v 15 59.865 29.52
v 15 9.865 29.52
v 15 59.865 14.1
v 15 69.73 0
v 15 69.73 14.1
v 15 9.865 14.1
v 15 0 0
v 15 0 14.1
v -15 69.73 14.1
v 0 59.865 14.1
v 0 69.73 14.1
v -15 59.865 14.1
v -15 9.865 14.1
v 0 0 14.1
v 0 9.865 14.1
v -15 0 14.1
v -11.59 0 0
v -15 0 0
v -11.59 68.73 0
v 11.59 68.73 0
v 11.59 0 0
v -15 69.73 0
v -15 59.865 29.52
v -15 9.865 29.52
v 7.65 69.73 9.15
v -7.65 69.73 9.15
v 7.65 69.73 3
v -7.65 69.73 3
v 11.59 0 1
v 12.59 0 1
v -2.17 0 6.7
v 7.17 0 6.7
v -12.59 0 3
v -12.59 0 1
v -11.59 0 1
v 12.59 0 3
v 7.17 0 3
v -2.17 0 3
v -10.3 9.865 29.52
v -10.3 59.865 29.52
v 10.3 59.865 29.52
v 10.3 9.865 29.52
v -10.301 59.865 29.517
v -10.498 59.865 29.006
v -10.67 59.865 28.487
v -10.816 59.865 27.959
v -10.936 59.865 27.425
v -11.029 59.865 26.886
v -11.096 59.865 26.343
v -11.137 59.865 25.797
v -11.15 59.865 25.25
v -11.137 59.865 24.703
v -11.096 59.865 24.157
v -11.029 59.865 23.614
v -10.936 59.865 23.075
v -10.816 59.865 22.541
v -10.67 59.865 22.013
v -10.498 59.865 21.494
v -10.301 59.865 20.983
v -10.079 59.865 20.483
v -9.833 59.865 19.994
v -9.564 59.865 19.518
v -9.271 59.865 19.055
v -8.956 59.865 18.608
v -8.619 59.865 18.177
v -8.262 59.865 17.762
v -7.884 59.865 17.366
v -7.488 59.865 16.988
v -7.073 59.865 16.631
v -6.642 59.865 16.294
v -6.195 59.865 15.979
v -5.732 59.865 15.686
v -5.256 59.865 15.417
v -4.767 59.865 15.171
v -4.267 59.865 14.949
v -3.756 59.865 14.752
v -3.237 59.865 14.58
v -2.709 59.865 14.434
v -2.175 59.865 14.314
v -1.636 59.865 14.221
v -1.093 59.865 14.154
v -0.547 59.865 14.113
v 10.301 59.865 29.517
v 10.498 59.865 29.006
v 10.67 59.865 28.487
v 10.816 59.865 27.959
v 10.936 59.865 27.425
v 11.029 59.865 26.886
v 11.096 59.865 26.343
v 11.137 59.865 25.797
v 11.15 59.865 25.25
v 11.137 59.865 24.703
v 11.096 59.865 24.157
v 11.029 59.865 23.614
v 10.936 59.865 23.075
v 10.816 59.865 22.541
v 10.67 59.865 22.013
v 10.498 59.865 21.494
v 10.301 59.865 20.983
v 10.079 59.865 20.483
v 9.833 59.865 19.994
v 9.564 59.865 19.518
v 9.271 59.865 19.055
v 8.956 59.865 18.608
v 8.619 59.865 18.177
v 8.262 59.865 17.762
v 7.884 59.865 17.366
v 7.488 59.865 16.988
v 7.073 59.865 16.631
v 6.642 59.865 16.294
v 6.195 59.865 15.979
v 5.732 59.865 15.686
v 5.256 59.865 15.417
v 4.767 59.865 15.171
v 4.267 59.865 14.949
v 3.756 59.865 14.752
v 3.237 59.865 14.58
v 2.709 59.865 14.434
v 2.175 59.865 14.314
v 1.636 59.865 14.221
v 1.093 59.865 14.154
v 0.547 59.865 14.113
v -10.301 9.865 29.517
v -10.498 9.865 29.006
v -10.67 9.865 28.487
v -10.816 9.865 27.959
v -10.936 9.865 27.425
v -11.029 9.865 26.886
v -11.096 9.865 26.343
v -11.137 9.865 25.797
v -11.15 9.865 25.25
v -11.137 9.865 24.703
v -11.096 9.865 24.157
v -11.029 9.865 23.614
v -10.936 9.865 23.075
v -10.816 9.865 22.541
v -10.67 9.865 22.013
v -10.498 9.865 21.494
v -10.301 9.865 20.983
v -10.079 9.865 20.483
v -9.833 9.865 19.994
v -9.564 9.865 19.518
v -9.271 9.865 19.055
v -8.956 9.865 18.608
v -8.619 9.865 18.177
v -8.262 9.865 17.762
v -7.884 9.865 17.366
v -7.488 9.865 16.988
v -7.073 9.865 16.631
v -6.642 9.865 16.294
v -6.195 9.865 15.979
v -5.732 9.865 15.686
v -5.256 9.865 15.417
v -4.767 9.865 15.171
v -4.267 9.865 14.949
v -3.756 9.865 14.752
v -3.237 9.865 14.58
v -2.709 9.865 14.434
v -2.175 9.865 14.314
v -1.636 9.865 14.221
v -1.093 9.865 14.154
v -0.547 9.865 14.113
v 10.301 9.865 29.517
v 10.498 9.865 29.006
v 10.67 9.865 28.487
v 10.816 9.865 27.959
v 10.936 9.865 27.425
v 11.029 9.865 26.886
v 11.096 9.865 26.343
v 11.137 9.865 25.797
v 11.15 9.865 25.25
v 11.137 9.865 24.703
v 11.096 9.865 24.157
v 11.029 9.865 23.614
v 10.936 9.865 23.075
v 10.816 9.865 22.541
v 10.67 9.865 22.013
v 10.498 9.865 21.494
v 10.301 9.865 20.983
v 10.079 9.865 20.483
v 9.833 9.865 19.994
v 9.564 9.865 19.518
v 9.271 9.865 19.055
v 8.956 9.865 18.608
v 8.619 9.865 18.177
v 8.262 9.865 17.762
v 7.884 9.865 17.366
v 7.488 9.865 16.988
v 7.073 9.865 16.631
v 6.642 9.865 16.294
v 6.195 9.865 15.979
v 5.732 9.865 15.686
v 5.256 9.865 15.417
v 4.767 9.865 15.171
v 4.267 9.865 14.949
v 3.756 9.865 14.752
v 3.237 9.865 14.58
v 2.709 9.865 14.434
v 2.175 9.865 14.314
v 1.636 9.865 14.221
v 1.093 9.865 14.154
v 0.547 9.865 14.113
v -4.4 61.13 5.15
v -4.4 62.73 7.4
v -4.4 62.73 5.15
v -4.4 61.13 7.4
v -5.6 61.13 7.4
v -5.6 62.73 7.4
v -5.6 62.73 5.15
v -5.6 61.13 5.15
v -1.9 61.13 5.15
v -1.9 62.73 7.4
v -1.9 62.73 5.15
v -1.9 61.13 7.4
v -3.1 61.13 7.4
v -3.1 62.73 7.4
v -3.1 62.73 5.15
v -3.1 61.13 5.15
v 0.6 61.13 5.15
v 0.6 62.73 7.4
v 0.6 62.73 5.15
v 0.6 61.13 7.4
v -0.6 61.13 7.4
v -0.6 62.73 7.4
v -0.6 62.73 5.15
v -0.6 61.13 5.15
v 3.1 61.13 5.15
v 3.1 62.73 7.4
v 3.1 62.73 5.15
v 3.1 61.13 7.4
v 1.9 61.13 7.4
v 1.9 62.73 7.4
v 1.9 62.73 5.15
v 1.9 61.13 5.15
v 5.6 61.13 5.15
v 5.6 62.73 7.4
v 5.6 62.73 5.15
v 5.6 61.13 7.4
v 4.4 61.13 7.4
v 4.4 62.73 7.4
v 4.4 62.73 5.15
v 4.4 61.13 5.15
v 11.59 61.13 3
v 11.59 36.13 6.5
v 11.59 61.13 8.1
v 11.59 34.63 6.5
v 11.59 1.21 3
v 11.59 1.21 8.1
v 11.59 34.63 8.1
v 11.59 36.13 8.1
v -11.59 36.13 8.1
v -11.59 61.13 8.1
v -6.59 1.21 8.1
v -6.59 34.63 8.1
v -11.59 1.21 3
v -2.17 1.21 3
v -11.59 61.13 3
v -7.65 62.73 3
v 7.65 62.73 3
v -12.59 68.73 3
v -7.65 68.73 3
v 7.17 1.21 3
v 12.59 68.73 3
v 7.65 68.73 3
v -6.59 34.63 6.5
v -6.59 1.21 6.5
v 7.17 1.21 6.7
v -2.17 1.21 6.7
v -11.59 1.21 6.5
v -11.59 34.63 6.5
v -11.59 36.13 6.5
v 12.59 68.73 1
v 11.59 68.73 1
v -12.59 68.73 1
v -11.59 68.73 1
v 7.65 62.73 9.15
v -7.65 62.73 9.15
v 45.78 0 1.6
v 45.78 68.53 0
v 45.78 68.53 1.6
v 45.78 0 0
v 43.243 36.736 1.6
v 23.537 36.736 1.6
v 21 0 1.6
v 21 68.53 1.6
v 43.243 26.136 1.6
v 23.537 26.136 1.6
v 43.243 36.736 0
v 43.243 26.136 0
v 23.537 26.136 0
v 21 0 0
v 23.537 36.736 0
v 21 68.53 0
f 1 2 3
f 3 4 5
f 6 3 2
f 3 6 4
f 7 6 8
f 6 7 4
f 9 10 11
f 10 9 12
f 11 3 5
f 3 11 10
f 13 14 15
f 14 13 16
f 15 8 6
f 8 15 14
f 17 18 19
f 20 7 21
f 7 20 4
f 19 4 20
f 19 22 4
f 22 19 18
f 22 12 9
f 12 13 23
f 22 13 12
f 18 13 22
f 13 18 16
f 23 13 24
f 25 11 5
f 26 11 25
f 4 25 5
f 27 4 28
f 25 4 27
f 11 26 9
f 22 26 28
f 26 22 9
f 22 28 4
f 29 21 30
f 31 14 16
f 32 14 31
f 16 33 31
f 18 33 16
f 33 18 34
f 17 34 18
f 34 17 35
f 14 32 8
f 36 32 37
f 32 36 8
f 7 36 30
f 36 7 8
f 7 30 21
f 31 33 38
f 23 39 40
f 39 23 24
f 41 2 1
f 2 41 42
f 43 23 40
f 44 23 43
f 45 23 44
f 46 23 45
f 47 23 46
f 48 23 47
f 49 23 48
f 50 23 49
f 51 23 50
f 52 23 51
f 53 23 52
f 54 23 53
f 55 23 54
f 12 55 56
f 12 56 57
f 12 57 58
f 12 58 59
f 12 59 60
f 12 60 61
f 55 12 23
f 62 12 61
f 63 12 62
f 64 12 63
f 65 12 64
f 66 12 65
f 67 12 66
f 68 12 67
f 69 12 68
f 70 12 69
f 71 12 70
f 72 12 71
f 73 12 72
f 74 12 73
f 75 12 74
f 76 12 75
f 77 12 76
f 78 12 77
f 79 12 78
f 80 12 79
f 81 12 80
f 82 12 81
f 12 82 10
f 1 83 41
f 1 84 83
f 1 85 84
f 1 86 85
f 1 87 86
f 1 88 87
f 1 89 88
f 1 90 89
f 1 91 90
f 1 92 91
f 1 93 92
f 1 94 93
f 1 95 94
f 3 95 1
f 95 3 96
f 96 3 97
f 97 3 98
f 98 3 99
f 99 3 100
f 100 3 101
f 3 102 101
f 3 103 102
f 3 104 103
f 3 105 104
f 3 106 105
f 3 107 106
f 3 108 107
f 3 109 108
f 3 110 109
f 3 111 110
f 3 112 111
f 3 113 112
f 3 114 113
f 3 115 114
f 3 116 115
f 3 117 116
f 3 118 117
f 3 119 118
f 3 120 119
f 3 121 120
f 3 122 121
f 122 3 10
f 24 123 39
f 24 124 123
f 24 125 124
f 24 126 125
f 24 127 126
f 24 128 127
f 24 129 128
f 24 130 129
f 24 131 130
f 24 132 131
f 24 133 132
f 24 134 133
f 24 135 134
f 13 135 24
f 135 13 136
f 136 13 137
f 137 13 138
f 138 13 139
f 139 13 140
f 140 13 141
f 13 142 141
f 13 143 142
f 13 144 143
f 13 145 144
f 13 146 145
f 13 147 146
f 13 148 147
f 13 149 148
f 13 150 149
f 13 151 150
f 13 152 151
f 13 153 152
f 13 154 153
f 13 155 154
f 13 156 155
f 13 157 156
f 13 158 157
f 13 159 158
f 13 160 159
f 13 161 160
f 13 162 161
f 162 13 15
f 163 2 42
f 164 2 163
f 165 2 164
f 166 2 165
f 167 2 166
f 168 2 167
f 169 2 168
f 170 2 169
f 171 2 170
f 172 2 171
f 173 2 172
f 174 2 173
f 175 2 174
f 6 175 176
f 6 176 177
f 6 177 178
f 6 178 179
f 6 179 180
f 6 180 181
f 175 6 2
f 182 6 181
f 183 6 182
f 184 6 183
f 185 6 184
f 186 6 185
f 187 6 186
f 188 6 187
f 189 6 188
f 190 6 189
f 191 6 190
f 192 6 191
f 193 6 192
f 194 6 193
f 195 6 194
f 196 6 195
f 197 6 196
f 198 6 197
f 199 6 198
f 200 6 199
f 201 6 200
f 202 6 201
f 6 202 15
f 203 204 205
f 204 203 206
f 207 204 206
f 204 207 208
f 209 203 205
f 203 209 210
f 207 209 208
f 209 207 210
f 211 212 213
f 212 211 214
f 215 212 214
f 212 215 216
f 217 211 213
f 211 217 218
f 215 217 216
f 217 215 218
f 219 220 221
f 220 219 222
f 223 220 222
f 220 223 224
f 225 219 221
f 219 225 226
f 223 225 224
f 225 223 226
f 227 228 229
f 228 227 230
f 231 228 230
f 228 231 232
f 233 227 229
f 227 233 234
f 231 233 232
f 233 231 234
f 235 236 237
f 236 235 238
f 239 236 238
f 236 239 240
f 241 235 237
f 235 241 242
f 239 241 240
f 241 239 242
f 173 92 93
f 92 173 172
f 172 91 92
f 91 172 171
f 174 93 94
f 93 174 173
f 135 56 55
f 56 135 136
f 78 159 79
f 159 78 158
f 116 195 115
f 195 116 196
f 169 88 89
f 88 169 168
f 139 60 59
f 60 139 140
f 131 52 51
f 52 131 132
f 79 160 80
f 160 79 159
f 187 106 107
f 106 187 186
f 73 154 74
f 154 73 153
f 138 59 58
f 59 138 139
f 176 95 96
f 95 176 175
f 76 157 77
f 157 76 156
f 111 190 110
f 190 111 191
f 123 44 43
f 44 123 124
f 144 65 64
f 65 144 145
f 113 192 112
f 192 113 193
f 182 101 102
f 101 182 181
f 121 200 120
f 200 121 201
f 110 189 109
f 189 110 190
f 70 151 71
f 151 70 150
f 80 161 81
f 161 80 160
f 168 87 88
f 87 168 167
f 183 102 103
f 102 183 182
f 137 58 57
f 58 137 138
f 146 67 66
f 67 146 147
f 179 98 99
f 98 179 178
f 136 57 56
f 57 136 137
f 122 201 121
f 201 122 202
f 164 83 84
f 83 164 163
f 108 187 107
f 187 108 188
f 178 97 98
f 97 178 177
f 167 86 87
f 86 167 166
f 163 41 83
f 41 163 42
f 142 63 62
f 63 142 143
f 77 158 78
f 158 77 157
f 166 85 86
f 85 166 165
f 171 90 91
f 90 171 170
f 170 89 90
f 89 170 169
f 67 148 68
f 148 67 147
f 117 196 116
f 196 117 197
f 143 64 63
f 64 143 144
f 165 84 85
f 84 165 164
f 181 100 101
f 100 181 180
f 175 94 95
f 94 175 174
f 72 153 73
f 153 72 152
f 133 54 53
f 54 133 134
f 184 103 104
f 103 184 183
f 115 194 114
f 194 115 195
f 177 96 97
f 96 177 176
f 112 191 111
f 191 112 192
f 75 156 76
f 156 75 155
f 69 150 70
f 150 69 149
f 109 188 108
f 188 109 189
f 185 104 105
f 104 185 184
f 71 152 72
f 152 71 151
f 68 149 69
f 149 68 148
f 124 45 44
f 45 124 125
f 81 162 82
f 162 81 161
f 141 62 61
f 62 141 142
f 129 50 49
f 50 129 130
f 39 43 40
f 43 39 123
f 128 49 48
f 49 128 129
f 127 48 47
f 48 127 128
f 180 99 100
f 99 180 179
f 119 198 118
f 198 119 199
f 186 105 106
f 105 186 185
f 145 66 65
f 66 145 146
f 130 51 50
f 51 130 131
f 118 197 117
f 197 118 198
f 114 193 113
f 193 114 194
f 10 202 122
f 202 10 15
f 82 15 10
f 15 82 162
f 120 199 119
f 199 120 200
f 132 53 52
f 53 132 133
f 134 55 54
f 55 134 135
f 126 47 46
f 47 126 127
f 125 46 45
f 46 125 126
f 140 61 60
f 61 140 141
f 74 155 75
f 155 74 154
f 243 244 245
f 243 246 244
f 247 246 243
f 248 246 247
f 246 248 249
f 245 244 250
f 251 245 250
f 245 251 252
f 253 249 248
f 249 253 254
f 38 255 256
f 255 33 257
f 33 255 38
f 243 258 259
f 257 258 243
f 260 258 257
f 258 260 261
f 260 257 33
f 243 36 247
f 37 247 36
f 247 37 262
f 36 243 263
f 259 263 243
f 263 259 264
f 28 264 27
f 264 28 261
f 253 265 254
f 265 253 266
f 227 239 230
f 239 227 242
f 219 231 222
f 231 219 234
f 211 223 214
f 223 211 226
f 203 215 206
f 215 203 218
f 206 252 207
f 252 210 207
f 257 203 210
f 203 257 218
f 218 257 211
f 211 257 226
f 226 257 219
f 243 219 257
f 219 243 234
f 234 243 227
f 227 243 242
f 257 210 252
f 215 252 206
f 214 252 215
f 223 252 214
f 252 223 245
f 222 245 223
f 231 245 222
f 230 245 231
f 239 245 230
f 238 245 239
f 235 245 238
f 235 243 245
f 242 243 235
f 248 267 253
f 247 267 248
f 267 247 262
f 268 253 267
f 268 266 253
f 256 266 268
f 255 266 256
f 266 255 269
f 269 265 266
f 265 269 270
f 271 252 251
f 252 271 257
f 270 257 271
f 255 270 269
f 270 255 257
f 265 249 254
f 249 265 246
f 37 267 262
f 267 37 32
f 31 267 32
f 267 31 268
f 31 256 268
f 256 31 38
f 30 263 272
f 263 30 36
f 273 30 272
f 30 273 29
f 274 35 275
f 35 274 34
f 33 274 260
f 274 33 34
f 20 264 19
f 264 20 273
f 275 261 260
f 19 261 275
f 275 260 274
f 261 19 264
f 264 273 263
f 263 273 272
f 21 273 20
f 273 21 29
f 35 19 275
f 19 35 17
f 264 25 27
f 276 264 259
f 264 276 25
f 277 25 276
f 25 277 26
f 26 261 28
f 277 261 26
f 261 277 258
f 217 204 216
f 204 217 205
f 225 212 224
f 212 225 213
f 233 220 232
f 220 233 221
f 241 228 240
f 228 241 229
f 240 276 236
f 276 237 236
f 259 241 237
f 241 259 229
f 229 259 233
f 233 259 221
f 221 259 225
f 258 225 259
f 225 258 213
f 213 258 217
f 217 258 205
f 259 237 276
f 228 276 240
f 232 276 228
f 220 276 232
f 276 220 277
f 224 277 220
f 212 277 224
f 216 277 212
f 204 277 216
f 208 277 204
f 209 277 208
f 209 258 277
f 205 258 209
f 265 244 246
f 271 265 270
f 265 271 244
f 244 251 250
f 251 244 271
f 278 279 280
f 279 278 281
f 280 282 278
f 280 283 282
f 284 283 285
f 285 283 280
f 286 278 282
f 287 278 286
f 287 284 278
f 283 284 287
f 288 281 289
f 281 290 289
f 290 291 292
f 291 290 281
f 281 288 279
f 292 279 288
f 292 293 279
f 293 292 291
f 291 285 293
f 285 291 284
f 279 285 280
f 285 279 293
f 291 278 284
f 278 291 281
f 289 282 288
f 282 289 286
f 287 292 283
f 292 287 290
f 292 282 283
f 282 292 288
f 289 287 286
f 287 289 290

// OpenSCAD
// file: params.scad
// Every part includes this file, so a fit measured on a test print changes in
// one place. All lengths in mm.

// Snap clip around an aerobar extension. The bore and the 30 mm block across
// the tube are the Onshape V8 crossbar's, which clips onto the Profile Design
// Airstryke extensions.
tube_bore = 22.3;
clip_width = 30;
// Solid between the top of the bore and the clip's closed face.
clip_floor = 6;
// The tightest of the fit test's 20.6, 21.0 and 21.4, and the best grip in PLA
// on a 10 mm slice. A full-length clip grips harder.
clip_mouth = 20.6;
// Over the tape where the bar pod sits: a paper strip's wrap length / pi.
bar_diameter = 32;

key_pitch = 19.05;

// Every fit-test cutout from 13.9 to 14.1 held a switch, so the middle one
// leaves margin either way.
switch_cutout = 14.0;
// MX switch clips latch under a lip this thick, and need a wider pocket below
// it to spring back out into.
switch_plate = 1.5;
switch_relief = 15.0;

m3_clearance = 3.4;
// Nominal M3 nuts are 2.4 thick and 5.5 across the flats.
m3_nut_depth = 2.6;
// main file
// The KB2040 in a box that snaps under a straight stretch of one extension,
// USB-C toward the base bar. A pod plugs into the JST XH header in its front
// face, so the board's own wiring is soldered once and stays put.
include <params.scad>

// Adafruit KB2040 (5302), from its board file: the PCB, and how far the USB-C
// receptacle hangs past the PCB's end and stands above it.
board = [33.02, 17.78, 1.6];
usb_overhang = 1.21;
usb_width = 8.94;
usb_height = 3.3;
// BOOT (SW3) and RESET (SW2) centers, from the PCB's USB-C end and from its
// D-pin edge, and their footprint along and across the board.
buttons = [[30.226, 3.8735], [30.226, 13.843]];
button = [4.6, 2.8];

// Top-entry B5B-XH-A, from JST's XH datasheet: across the pins, along the
// mating axis, and deep. GND and GP4 through GP7, for up to four keys.
xh_pins = 5;
xh_pitch = 2.5;
xh = [(xh_pins - 1) * xh_pitch + 4.9, 7, 5.75];
// The pin row sits 2.35 from one face and 3.4 from the other, so the slots
// take the header either way up.
xh_row = [2.35, 3.4];
pin_slot = 1.2;
// The header's tails go through this like through a PCB, and the solder on
// them holds the header in when a plug is pulled.
plate = 1.6;

clearance = 0.2;
stop = 1.5;
// Wires run forward here, beside the D-pin edge, not over the board's buttons.
channel = 5;
// Open on the lid side: room for the iron at every tail.
bay = 25;
// Snapped on and held at clip_mouth.
clip_length = 50;
// Along the board on either side of the buttons, for a fingernail.
reach = 3;
lid_thickness = 1.6;
groove = 1;
lip = 1;
front_lip = 1;
gap = 6;

r = tube_bore / 2;
inset = sqrt(r * r - (clip_mouth / 2) * (clip_mouth / 2));
pocket_width = board[1] + 2 * clearance;
inner = channel + pocket_width;
depth = board[2] + usb_height + clearance;
header_depth = xh[2] + 2 * clearance;
slot_height = lid_thickness + 2 * clearance;
// z of the board's floor (toward the tube), the lid's face, and the header's
// floor, deeper than the board's so the lid closes right under the USB-C.
ceiling = -(r + clip_floor);
opening = ceiling - depth;
header_top = opening + header_depth;
bottom = opening - slot_height - lip;
d_edge = -inner / 2 + channel + clearance;

// The receptacle ends flush with the back.
rear_wall = usb_overhang;
board_end = rear_wall + board[0] + 2 * clearance;
plate_y = board_end + stop + bay;
length = plate_y + plate + xh[1];

// Centered on the lid, so it lands over both buttons with either face up.
window_center = rear_wall + buttons[0][0];
window_length = button[0] + 2 * reach;
window_half = max([for (b = buttons) abs(d_edge + b[1]) + button[1] / 2]) + 1;

$fn = 128;

// Modeled as mounted and printed: the tube's center on the origin, running
// along y, the base bar toward -y, the mouth up.
module carrier() {
    difference() {
        union() {
            translate([-clip_width / 2, 0, bottom])
                cube([clip_width, length, -r - bottom]);
            translate([-clip_width / 2, (length - clip_length) / 2, bottom])
                cube([clip_width, clip_length, inset - bottom]);
        }
        translate([0, -1, 0]) rotate([-90, 0, 0]) cylinder(r = r, h = length + 2);
        translate([-inner / 2 + channel, rear_wall, opening])
            cube([pocket_width, plate_y - rear_wall, depth]);
        // Stops at the PCB's top, so the board's edge rests against the step.
        translate([-inner / 2, rear_wall, opening])
            cube([channel, plate_y - rear_wall, depth - board[2]]);
        translate([-inner / 2, board_end, opening])
            cube([inner, bay + stop, depth]);
        translate([d_edge + board[1] / 2 - usb_width / 2 - clearance, -1, bottom - 1])
            cube([usb_width + 2 * clearance, rear_wall + 2, ceiling - board[2] + clearance - bottom + 1]);
        // The lid slides in from the back, and stops short of the front face.
        translate([-inner / 2 - groove, -1, opening - slot_height])
            cube([inner + 2 * groove, length - front_lip + 1, slot_height]);
        translate([-inner / 2, -1, bottom - 1])
            cube([inner, length - front_lip + 1, opening - slot_height - bottom + 1]);
        translate([-xh[0] / 2 - clearance, plate_y + plate, opening])
            cube([xh[0] + 2 * clearance, xh[1] + 1, header_depth]);
        for (i = [0 : xh_pins - 1])
            translate([(i - (xh_pins - 1) / 2) * xh_pitch - pin_slot / 2, plate_y - 1,
                       header_top - xh_row[1] - pin_slot / 2])
                cube([pin_slot, plate + 2, xh_row[1] - xh_row[0] + pin_slot]);
    }
    // As tall as the PCB, so the wires in the channel pass under it.
    translate([-inner / 2, board_end, ceiling - board[2]])
        cube([inner, stop, board[2]]);
}

module lid() {
    width = inner + 2 * groove - 2 * clearance;
    difference() {
        cube([width, length - front_lip - clearance, lid_thickness]);
        translate([width / 2 - window_half, window_center - window_length / 2, -1])
            cube([2 * window_half, window_length, lid_thickness + 2]);
    }
}

translate([0, 0, -bottom]) carrier();
translate([clip_width / 2 + gap, 0, 0]) lid();
